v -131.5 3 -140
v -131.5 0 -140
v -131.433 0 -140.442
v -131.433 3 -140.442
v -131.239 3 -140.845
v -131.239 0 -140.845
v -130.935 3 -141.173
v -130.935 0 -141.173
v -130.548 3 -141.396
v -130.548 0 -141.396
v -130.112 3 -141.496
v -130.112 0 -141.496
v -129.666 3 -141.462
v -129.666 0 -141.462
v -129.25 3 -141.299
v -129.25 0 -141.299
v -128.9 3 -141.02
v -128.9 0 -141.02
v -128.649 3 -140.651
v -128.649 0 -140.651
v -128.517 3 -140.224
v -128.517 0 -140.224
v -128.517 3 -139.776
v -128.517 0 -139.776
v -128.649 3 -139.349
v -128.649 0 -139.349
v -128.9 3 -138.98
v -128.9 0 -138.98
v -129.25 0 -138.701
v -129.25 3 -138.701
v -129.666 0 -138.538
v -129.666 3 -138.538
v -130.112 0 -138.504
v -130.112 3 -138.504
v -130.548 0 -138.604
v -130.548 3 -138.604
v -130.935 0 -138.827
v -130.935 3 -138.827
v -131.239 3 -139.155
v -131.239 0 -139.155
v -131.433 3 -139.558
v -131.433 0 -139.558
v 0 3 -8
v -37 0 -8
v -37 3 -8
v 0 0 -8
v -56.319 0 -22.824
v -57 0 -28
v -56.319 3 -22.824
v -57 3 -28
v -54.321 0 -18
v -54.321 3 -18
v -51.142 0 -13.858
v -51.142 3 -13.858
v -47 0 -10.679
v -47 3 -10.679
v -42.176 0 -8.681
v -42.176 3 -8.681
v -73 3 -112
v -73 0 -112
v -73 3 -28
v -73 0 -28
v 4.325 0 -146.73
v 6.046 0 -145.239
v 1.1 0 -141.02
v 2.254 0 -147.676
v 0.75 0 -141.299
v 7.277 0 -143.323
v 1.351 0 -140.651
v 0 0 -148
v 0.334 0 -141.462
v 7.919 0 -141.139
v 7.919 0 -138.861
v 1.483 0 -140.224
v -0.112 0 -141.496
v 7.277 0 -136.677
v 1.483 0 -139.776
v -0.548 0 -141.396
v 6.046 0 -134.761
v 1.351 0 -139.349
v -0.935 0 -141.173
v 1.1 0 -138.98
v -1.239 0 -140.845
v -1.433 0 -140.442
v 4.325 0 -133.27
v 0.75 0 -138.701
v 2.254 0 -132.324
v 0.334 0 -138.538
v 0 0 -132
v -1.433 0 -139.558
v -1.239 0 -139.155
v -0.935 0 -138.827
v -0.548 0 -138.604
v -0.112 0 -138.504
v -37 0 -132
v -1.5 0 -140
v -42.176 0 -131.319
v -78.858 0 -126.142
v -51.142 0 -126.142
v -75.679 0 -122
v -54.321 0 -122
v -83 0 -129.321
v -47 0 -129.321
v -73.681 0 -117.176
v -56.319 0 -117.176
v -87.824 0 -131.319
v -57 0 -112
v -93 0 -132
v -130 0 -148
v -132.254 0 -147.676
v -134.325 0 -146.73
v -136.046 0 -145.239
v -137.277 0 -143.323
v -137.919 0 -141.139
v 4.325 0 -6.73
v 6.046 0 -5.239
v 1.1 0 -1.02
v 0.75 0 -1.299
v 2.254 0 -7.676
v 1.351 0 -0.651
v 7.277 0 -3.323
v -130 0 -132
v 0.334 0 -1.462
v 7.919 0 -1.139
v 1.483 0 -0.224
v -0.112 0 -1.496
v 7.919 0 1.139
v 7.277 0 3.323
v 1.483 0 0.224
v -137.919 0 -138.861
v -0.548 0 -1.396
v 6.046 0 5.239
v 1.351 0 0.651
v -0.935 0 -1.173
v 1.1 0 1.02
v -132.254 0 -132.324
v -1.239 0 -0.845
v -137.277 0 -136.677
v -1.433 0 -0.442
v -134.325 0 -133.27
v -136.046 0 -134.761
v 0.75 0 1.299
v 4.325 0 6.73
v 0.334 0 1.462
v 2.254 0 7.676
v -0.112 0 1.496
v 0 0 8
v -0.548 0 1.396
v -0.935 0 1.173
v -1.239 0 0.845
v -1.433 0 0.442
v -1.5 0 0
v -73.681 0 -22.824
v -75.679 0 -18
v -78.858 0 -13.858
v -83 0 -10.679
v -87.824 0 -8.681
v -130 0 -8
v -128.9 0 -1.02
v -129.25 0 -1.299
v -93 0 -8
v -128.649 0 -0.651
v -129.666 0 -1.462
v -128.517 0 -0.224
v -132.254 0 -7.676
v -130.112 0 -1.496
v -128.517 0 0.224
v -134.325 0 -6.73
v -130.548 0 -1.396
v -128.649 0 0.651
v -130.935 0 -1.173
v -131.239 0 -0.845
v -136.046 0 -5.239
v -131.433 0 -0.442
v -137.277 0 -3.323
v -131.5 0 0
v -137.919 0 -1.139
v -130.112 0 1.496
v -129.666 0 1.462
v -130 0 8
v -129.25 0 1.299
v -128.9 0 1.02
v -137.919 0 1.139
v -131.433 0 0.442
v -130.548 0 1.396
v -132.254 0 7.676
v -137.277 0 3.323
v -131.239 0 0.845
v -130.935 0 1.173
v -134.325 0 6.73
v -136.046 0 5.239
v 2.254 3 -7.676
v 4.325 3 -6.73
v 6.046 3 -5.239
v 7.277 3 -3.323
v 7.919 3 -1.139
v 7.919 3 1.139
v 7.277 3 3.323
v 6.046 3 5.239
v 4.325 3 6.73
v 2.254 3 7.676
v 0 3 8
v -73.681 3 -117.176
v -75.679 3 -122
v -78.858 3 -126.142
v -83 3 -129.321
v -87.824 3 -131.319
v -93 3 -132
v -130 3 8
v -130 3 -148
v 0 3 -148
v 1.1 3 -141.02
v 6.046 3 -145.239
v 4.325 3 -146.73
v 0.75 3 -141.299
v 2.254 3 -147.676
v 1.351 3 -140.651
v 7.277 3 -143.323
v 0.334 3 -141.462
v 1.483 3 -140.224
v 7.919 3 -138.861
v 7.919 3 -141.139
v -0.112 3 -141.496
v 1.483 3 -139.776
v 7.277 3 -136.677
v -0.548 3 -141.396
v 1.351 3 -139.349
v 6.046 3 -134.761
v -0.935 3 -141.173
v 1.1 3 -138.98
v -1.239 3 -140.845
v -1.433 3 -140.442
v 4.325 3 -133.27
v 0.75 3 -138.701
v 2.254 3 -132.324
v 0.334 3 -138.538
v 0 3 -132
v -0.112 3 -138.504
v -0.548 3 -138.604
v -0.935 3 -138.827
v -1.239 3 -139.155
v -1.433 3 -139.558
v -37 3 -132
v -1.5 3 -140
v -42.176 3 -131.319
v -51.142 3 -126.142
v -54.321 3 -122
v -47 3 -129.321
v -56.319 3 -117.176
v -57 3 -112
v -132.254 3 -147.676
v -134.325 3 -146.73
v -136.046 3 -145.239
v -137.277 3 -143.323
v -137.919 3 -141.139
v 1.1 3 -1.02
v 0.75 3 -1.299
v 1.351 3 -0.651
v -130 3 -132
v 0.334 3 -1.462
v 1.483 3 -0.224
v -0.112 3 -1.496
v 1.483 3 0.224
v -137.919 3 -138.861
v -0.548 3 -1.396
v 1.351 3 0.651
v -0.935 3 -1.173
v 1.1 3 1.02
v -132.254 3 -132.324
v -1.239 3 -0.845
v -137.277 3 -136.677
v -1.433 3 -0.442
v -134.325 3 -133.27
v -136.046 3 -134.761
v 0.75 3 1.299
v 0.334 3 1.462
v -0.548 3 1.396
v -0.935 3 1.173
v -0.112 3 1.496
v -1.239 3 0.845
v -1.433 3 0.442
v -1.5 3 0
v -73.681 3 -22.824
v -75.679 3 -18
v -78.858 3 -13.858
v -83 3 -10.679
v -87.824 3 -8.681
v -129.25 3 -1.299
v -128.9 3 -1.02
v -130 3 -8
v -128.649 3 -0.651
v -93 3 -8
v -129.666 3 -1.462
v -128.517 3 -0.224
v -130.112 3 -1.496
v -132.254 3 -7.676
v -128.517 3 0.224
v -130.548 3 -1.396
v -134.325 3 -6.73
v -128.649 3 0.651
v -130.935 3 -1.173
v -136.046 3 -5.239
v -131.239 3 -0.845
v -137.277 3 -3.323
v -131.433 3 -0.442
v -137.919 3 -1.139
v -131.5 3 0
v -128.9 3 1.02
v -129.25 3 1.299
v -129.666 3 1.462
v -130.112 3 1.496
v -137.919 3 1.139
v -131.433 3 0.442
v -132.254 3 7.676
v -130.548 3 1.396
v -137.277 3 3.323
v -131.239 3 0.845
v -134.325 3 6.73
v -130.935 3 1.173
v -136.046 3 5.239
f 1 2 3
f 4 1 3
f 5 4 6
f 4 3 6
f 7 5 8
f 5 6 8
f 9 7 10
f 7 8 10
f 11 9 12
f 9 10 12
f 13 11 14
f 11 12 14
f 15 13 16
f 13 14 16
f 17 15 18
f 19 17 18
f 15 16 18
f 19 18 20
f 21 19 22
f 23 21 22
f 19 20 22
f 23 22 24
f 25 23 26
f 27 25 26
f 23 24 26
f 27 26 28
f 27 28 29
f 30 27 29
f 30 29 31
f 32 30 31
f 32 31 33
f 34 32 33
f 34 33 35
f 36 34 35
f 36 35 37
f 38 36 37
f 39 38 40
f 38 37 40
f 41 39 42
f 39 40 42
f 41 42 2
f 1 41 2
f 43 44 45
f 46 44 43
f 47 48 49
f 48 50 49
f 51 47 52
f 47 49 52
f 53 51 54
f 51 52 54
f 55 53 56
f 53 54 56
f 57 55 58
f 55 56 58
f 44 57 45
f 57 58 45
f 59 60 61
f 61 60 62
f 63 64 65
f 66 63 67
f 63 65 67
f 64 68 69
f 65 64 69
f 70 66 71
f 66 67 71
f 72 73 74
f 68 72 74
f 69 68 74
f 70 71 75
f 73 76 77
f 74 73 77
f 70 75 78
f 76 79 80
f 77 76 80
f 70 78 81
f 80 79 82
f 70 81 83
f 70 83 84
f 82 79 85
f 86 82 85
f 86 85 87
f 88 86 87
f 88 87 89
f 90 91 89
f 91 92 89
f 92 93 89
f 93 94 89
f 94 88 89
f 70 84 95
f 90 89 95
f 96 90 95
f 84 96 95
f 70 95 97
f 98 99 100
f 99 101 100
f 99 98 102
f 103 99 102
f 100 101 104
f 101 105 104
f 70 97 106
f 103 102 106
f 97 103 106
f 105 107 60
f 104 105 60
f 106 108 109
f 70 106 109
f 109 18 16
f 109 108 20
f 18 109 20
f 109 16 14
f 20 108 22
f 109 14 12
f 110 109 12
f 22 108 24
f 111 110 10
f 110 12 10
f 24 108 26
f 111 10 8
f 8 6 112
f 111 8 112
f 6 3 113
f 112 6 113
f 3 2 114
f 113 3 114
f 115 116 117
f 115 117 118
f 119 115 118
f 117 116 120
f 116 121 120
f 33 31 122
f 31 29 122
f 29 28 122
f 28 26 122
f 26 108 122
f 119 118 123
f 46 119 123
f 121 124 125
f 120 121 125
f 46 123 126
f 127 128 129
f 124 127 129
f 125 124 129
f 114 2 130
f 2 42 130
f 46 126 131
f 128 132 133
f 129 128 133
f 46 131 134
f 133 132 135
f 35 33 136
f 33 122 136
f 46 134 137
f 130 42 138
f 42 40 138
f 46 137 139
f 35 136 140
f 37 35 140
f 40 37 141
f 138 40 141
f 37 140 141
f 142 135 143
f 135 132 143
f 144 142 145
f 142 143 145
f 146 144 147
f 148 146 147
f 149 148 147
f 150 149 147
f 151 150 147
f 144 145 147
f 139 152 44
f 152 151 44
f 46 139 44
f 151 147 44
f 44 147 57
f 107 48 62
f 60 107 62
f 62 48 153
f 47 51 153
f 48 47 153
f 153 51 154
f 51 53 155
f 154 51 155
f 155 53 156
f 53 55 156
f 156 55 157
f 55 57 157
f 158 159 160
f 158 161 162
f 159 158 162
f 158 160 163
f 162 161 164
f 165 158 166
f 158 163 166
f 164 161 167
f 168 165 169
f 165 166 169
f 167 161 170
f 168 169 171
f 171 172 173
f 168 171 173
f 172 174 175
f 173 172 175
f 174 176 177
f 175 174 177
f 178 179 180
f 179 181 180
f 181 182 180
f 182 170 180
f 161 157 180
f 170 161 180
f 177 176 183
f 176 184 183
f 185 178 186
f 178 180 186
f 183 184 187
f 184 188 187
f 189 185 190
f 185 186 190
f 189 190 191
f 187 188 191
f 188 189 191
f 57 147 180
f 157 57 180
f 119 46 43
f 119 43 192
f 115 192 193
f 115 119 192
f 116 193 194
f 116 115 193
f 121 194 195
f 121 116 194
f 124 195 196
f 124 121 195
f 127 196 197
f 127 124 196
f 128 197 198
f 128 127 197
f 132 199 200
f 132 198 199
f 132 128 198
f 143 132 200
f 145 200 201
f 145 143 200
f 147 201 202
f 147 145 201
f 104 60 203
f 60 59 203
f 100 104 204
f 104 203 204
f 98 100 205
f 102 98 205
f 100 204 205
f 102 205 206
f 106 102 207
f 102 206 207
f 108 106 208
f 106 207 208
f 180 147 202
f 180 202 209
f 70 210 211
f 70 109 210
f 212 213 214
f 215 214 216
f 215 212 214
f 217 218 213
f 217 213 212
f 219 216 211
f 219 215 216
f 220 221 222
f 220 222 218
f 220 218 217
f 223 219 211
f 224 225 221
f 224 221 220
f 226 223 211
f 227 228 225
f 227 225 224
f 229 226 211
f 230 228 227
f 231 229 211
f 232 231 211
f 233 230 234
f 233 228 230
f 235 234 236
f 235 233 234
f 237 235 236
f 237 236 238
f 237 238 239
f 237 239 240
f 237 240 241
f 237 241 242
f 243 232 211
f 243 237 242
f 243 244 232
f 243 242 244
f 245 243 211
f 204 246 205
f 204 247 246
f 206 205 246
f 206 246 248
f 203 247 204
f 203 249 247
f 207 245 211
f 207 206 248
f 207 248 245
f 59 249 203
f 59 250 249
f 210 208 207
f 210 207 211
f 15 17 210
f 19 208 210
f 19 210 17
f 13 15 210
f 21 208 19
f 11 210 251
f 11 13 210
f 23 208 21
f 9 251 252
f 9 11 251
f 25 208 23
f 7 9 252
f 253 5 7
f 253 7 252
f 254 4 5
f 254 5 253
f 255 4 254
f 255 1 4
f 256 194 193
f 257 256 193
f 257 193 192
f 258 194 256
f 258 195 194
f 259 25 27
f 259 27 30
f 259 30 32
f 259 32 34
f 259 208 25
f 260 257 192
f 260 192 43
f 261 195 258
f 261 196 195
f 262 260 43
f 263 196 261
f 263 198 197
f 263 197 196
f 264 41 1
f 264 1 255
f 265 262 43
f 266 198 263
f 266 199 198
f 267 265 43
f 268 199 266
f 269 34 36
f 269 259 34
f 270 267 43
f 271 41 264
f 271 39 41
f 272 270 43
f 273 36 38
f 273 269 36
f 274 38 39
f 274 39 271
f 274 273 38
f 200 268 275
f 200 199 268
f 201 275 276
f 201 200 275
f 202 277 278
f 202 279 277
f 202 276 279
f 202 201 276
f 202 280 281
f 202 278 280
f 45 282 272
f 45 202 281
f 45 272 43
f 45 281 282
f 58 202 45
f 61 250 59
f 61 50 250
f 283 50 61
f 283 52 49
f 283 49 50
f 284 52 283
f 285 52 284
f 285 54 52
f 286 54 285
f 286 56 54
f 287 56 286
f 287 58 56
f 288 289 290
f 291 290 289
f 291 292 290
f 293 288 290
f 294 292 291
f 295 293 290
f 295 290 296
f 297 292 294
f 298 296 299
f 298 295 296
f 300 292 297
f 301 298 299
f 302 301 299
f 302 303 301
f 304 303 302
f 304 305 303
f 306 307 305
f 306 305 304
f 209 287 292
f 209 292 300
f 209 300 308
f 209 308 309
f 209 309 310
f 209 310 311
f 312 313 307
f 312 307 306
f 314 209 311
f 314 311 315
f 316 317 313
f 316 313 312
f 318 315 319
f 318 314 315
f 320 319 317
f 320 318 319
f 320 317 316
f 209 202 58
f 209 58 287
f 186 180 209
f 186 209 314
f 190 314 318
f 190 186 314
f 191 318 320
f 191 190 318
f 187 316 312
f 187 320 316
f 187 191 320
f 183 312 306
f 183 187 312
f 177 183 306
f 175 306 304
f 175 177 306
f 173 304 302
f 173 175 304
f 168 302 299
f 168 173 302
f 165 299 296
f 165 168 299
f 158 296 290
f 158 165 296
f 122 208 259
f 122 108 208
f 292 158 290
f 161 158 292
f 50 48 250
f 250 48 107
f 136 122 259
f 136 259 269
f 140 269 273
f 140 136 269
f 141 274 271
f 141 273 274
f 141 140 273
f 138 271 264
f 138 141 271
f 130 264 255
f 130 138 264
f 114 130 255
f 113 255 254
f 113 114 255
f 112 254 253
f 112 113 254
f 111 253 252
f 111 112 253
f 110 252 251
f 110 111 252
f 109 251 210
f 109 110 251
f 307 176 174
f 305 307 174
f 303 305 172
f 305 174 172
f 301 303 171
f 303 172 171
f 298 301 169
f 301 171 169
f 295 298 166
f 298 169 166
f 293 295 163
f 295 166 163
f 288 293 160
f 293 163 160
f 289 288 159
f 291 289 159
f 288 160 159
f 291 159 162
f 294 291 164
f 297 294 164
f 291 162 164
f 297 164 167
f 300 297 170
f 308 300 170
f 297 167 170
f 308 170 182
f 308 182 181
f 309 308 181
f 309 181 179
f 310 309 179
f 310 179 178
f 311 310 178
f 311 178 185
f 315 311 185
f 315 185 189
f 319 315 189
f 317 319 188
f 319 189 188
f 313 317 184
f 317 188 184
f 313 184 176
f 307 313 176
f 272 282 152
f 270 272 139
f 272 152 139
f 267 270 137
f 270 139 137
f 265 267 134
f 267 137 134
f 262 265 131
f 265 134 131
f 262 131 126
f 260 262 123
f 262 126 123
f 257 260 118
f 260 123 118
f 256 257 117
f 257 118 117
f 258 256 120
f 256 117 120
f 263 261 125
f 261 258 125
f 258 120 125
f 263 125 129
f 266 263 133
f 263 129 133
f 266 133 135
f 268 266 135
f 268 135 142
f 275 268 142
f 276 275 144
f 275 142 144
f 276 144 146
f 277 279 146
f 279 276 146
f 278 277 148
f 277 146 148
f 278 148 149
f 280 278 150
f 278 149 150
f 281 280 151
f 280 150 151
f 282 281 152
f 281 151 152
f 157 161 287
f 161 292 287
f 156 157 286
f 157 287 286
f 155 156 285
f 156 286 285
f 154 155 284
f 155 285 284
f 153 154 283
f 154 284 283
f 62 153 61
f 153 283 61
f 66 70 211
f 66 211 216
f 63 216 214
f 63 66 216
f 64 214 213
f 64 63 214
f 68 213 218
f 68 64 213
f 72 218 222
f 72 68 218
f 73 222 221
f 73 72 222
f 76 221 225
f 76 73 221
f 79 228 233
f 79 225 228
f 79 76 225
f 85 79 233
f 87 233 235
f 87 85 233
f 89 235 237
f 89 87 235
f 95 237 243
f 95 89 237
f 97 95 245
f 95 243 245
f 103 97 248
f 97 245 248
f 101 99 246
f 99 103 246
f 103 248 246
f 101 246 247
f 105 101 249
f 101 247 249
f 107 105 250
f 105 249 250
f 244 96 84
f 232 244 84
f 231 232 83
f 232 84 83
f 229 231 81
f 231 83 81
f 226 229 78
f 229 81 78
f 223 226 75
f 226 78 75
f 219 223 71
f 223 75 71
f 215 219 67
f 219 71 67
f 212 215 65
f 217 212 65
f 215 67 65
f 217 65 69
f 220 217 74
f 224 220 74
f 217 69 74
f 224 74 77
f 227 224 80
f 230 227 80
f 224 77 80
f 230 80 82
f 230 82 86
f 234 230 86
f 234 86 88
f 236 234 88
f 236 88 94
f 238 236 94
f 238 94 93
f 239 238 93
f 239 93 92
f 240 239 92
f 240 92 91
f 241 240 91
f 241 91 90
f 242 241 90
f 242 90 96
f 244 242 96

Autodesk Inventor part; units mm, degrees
ref_plane "YZ Plane" through (0, 0, 0) normal (1, 0, 0) x (0, 1, 0)
ref_plane "XZ Plane" through (0, 0, 0) normal (0, 1, 0) x (-1, 0, 0)
ref_plane "XY Plane" through (0, 0, 0) normal (0, 0, 1) x (1, 0, 0)
sketch "Sketch1" plane through (0, 0, 0) normal (0, 1, 0) x (-1, 0, 0)
  line L0 (0, 0) -> (130, 0)
  line L1 (130, 0) -> (130, -140)
  line L2 (130, -140) -> (0, -140)
  line L3 (0, -140) -> (0, 0)
  circle A0 centre (0, 0) radius 1.5
  circle A1 centre (130, 0) radius 1.5
  circle A2 centre (130, -140) radius 1.5
  circle A3 centre (0, -140) radius 1.5
  circle A4 centre (0, -140) radius 8
  circle A5 centre (130, -140) radius 8
  circle A6 centre (130, 0) radius 8
  circle A7 centre (0, 0) radius 8
  line L4 (130, 0) -> (0, 0) construction
  line L5 (130, -8) -> (0, -8)
  line L6 (0, 8) -> (130, 8)
  arc A8 (130, -8) -> (130, 8) centre (130, 0) ccw
  arc A9 (0, 8) -> (0, -8) centre (0, 0) ccw
  line L7 (130, -140) -> (0, -140) construction
  line L8 (130, -148) -> (0, -148)
  line L9 (0, -132) -> (130, -132)
  arc A10 (130, -148) -> (130, -132) centre (130, -140) ccw
  arc A11 (0, -132) -> (0, -148) centre (0, -140) ccw
  line L10 (65, 0) -> (65, -70)
  line L11 (65, -140) -> (65, 0) construction
  line L12 (73, -140) -> (73, 0)
  line L13 (57, 0) -> (57, -140)
  arc A12 (57, -140) -> (73, -140) centre (65, -140) ccw
  arc A13 (73, 0) -> (57, 0) centre (65, 0) ccw
  dimension "d0" = 130
  dimension "d1" = 140
  dimension "d2" = 3
  dimension "d3" = 3
  dimension "d4" = 3
  dimension "d5" = 3
  dimension "d6" = 16
  dimension "d7" = 16
  dimension "d8" = 16
  dimension "d9" = 16
  dimension "d10" = 70
  dimension "d14" = 8
extrude "Extrusion1" add sketch "Sketch1" along normal blind 3 contours A0 L3 A7 L0 | L0 A7 L3 A0 | A7 L6 A13 L0 | L0 L13 L5 A7 | A13 L0 | L0 L10 L5 L13 | A4 L2 A3 L3 | L9 L13 L2 A4 | L3 A3 L2 A4 | L5 L12 L9 L13 | L0 L12 L5 L10 | L6 A6 L0 A13 | L2 A12 L8 A4 | L9 L12 L2 L13 | L0 A6 L5 L12 | A6 L1 A1 L0 | L2 A12 | A12 L2 A5 L8 | L9 A5 L2 L12 | L0 A1 L1 A6 | A5 L2 A2 L1 | L1 A2 L2 A5
fillet "Fillet1" radius 20 4 edges at (-57, 1.5, -132) (-73, 1.5, -132) (-57, 1.5, -8) (-73, 1.5, -8)
properties part number "Handle 2"
